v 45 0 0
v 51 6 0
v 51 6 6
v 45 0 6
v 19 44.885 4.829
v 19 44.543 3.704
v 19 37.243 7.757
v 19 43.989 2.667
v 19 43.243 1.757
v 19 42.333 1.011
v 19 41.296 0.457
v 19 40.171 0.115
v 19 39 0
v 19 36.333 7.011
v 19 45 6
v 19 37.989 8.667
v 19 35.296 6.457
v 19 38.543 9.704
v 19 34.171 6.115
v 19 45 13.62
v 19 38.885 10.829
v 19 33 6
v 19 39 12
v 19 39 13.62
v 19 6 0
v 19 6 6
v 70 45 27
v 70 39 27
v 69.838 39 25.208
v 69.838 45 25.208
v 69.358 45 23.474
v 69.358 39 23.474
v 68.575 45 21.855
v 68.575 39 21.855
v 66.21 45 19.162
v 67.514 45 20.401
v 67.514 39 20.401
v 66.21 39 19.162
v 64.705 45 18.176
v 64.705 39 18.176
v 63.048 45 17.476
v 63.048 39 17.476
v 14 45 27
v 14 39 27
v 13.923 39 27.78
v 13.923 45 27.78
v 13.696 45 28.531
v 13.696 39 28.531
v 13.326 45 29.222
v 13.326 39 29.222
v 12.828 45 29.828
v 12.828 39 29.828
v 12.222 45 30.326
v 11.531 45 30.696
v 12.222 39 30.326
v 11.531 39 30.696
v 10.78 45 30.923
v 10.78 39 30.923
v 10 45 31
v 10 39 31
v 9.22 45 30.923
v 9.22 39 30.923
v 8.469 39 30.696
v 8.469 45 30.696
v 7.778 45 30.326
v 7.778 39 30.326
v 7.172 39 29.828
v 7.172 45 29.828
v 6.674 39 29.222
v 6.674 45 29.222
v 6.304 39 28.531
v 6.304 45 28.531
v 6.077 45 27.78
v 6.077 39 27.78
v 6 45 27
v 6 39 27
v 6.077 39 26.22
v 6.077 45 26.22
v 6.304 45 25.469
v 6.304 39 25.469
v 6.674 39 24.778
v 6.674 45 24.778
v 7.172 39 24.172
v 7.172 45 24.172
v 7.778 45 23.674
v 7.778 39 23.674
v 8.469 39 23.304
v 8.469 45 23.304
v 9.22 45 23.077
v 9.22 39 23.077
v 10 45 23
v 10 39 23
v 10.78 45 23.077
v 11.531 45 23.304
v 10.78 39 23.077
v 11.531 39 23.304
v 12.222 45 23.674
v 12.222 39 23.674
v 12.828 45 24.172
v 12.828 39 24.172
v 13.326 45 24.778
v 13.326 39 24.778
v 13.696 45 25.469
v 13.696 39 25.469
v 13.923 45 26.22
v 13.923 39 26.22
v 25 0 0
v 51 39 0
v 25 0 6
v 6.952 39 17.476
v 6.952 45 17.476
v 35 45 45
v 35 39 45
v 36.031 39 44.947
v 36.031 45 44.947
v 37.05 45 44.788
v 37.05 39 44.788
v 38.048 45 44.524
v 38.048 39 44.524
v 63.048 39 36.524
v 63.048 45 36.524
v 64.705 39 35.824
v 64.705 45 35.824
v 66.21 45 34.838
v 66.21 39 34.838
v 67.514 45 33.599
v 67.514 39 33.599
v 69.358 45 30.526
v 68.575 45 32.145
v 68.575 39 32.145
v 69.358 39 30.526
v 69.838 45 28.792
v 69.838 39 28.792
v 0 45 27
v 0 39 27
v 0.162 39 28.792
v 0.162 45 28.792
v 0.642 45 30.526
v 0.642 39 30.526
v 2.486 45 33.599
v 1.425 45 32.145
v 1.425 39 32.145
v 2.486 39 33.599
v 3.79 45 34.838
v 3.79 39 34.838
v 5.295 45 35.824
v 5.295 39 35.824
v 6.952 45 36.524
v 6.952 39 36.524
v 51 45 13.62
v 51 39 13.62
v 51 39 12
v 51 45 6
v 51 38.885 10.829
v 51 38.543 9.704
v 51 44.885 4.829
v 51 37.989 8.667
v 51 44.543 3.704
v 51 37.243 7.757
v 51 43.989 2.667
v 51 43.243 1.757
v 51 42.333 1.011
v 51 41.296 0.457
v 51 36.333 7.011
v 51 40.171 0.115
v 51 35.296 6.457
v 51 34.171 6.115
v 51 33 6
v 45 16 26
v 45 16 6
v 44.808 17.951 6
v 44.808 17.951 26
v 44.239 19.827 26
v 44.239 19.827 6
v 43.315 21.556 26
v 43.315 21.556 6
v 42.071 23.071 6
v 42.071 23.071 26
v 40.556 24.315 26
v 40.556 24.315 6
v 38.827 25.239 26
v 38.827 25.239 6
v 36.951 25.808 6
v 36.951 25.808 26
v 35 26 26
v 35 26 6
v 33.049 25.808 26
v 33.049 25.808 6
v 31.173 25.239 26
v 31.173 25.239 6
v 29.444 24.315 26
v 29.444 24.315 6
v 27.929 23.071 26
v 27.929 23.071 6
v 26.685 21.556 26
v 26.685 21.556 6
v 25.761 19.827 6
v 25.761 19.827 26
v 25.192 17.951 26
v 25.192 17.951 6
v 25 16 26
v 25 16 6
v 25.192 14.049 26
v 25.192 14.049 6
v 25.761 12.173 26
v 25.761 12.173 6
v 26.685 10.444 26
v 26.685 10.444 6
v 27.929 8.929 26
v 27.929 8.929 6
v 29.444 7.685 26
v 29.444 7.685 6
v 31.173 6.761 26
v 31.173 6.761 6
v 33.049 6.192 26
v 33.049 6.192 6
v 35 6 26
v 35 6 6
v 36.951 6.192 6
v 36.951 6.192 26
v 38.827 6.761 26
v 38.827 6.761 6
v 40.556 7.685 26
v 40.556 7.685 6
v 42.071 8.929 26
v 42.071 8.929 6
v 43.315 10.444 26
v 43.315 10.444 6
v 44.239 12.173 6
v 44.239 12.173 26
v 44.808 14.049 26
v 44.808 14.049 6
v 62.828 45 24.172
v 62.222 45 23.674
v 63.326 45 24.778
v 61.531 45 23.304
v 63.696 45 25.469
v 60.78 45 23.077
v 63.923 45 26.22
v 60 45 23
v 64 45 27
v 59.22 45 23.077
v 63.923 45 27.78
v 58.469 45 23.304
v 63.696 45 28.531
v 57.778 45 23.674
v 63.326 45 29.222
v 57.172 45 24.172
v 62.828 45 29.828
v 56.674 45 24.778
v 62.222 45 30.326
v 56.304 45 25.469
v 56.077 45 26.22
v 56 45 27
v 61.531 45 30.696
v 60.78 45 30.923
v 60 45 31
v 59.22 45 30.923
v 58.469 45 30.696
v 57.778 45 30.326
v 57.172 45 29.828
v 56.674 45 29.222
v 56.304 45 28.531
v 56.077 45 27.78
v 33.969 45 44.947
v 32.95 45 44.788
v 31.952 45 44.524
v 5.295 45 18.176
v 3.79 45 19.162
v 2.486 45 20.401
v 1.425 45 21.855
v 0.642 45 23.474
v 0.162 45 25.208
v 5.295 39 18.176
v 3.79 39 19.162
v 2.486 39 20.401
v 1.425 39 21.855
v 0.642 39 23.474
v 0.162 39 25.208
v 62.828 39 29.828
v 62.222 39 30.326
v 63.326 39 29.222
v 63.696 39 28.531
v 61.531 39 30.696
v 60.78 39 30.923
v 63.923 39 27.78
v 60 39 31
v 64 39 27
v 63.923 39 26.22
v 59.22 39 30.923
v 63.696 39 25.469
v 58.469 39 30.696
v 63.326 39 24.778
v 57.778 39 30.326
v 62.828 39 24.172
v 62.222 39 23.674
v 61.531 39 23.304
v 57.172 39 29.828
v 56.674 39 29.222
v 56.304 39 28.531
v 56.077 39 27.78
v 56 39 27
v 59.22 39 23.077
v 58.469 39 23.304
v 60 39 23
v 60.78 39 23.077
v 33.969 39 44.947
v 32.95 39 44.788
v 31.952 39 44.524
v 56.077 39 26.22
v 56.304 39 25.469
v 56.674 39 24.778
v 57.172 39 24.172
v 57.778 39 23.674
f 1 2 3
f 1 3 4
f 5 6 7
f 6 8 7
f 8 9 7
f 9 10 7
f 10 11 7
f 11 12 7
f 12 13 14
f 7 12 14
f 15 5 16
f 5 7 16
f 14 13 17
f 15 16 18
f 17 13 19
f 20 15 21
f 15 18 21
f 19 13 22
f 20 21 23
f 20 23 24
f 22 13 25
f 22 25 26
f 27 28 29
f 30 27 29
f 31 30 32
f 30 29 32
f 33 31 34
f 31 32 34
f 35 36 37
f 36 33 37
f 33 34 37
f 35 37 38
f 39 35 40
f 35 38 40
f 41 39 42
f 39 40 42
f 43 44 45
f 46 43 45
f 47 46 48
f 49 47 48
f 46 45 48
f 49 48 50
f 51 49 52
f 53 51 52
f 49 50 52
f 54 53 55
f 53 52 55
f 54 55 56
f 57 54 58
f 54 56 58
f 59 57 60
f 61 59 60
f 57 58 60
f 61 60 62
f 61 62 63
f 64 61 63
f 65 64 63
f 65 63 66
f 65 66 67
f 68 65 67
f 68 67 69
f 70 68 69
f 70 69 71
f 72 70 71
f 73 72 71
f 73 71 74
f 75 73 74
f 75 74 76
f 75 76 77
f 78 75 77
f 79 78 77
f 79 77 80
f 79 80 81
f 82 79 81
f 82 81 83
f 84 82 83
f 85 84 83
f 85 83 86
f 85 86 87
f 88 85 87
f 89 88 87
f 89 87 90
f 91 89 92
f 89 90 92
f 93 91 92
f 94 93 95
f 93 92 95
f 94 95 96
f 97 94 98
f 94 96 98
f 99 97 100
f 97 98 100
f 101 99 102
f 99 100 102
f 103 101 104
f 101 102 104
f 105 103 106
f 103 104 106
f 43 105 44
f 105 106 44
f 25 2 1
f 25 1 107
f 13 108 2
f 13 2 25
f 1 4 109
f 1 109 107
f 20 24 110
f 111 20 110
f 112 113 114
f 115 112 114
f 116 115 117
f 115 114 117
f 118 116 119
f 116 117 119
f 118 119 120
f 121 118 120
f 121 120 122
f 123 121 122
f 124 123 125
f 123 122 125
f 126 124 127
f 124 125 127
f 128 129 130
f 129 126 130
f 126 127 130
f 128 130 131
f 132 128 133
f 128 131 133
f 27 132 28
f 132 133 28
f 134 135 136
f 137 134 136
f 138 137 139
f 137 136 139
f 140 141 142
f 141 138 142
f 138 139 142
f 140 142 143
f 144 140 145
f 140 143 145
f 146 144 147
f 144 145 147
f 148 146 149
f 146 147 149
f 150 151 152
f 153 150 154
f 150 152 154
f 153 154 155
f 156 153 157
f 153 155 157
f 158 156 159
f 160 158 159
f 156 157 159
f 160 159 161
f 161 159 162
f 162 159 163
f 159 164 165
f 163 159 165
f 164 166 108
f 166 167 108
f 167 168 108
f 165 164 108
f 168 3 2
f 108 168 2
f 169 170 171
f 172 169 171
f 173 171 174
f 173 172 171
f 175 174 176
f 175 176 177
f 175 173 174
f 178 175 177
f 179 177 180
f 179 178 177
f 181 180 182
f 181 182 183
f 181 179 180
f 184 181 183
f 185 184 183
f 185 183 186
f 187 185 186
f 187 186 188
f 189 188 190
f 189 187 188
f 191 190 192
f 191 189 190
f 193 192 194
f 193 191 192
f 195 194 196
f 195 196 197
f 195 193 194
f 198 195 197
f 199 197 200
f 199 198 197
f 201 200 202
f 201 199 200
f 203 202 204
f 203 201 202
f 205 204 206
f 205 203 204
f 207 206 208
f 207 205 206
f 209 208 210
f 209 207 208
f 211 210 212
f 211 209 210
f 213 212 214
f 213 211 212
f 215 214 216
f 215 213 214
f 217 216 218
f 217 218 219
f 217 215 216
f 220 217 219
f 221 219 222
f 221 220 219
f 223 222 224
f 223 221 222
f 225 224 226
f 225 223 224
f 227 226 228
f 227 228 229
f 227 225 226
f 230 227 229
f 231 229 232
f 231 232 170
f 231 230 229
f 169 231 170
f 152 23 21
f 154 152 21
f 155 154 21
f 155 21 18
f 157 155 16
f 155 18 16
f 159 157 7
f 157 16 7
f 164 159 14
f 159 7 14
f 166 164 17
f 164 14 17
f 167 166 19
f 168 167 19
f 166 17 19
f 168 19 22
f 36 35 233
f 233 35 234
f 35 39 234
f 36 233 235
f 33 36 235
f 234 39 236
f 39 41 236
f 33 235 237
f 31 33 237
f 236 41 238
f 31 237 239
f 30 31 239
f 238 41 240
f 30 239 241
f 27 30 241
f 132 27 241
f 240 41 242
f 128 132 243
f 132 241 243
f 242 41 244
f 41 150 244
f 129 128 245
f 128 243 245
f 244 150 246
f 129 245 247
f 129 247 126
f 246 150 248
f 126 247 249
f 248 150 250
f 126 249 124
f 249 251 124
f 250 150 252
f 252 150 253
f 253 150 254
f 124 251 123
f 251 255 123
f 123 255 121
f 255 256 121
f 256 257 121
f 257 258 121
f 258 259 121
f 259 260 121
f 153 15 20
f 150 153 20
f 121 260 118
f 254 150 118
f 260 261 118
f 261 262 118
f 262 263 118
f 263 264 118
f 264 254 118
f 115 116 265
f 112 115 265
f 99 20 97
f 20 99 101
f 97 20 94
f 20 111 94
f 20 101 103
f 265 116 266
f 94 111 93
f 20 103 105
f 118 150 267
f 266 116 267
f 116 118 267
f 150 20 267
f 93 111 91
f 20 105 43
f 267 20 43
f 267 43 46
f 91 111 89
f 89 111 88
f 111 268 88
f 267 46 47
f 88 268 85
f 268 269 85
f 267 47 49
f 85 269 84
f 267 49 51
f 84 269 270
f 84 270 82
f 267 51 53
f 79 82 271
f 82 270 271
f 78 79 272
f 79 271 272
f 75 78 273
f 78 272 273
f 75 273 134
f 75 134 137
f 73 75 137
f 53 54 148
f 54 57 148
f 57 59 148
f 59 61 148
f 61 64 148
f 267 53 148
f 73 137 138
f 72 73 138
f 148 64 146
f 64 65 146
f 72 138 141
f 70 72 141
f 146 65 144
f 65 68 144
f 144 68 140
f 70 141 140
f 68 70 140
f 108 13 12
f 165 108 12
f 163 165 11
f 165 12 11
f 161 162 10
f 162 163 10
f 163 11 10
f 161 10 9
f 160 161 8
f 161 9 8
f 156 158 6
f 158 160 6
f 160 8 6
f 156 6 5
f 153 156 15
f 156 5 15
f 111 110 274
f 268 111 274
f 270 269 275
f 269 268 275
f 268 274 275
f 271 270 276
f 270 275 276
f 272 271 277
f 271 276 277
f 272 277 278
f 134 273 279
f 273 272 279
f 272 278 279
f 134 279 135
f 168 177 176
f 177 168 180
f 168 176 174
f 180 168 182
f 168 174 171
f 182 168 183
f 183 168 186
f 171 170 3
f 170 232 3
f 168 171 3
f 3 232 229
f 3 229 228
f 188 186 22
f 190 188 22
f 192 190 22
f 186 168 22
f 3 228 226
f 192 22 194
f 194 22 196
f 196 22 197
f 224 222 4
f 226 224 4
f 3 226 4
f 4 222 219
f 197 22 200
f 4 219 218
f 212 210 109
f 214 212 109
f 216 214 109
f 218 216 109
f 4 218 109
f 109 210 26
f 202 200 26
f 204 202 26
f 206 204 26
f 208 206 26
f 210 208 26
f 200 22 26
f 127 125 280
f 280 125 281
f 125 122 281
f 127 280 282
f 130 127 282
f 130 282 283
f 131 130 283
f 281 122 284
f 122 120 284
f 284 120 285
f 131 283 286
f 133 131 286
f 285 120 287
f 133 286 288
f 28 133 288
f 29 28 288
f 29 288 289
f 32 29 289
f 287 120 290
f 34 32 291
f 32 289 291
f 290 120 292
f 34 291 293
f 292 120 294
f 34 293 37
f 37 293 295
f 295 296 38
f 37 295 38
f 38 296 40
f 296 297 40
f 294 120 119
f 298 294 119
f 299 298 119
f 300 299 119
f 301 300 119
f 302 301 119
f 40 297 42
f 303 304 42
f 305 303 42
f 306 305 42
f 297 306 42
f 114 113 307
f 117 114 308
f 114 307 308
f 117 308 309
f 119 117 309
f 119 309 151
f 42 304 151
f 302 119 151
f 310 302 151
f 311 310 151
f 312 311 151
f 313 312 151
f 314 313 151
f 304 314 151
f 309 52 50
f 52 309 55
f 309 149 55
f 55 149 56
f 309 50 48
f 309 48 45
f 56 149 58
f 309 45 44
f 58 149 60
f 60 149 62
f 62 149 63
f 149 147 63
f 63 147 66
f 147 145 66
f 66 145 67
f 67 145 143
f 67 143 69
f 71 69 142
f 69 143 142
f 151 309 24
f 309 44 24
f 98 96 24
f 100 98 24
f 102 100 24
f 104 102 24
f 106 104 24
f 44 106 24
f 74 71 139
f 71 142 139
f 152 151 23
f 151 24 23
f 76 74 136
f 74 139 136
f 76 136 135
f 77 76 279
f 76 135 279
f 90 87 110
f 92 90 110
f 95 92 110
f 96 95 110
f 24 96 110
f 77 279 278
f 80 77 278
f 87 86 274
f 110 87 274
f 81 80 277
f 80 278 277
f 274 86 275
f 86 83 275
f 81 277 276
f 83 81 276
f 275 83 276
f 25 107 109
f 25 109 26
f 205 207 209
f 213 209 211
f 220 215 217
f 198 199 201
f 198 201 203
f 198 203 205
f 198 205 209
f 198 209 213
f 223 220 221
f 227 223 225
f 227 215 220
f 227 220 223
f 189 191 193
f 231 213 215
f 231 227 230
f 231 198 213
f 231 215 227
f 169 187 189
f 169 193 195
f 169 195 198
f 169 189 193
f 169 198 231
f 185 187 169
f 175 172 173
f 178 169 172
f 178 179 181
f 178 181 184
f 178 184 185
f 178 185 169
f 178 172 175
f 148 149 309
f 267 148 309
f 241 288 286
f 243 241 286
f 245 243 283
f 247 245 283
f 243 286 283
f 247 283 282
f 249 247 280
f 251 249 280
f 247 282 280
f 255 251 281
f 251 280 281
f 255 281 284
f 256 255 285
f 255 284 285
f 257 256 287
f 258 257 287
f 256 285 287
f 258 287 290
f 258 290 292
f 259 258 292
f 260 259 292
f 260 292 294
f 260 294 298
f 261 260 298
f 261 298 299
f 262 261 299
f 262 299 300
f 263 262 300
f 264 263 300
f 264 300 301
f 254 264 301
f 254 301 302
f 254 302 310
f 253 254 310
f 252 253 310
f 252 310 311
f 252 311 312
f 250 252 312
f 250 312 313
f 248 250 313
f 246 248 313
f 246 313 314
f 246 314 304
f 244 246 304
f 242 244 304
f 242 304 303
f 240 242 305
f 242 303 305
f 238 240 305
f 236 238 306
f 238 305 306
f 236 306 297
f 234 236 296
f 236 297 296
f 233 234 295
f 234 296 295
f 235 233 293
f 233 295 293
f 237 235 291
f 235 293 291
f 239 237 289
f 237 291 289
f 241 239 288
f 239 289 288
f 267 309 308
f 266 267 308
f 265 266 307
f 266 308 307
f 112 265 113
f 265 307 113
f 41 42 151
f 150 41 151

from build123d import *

# Parameters (mm, degrees)
F1_DEPTH = 70
F2_R     = 4
F3_DEPTH = 45.001
F4_R     = 8
F5_DEPTH = 45.001


with BuildPart() as f1:
    # F0 (on Right) → F1 (new body)
    with BuildSketch(Plane.YZ):
        with BuildLine():
            Line((0, 6), (0, 0))
            Line((0, 0), (39, 0))
            ThreePointArc((39, 0), (43.2426406871, 1.7573593129), (45, 6))
            Line((45, 6), (45, 45))
            Line((45, 45), (39, 45))
            Line((39, 45), (39, 12))
            ThreePointArc((39, 12), (37.2426406871, 7.7573593129), (33, 6))
            Line((33, 6), (0, 6))
        make_face()
    extrude(amount=F1_DEPTH)

    # F2 (on Front) → F3 (cut, through all)
    with BuildSketch(Plane.XZ):
        with Locations((10, 27)):
            Circle(F2_R)
        with Locations((60, 27)):
            Circle(F2_R)
        with BuildLine():
            ThreePointArc((63.047757271, 36.524241472), (68.0770530737, 32.8958641135), (70, 27))
            Line((70, 27), (70, 45))
            Line((70, 45), (35, 45))
            ThreePointArc((35, 45), (36.5423335048, 44.880344496), (38.047757271, 44.524241472))
            Line((38.047757271, 44.524241472), (63.047757271, 36.524241472))
        make_face()
        with BuildLine():
            Line((51, 13.620400082), (51, 0))
            Line((51, 0), (70, 0))
            Line((70, 0), (70, 27))
            ThreePointArc((70, 27), (68.0770699689, 21.1041590322), (63.0478118565, 17.4757759955))
            Line((63.0478118565, 17.4757759955), (51, 13.620400082))
        make_face()
        with BuildLine():
            Line((0, 0), (19, 0))
            Line((19, 0), (19, 13.620400082))
            Line((19, 13.620400082), (6.9521881435, 17.4757759955))
            ThreePointArc((6.9521881435, 17.4757759955), (1.922930031, 21.1041590323), (0, 27.0000000001))
            Line((0, 27.0000000001), (0, 0))
        make_face()
        with BuildLine():
            Line((0, 45), (0, 27.0000000001))
            ThreePointArc((0, 27.0000000001), (1.9229469263, 32.8958641136), (6.952242729, 36.524241472))
            Line((6.952242729, 36.524241472), (31.952242729, 44.524241472))
            ThreePointArc((31.952242729, 44.524241472), (33.4576664952, 44.880344496), (35, 45))
            Line((35, 45), (0, 45))
        make_face()
    extrude(amount=-F3_DEPTH, mode=Mode.SUBTRACT)

    # F4 (on Top) → F5 (cut, through all)
    with BuildSketch(Plane.XY):
        with Locations((35, 16)):
            Circle(F4_R)
        Polygon((19, 0), (25, 0), (19, 6), align=None)
        Polygon((45, 0), (51, 0), (51, 6), align=None)
    extrude(amount=F5_DEPTH, mode=Mode.SUBTRACT)

    # F7 (on offset) → F8 (revolve)
    with BuildSketch(Plane.XZ.offset(-16)):
        Polygon((35, 26), (35, 0), (43, 0), (43, 6), (45, 6), (45, 26), align=None)
    revolve(axis=Axis((35, 16, 13), (0, 0, 1)))


solid = f1.part
